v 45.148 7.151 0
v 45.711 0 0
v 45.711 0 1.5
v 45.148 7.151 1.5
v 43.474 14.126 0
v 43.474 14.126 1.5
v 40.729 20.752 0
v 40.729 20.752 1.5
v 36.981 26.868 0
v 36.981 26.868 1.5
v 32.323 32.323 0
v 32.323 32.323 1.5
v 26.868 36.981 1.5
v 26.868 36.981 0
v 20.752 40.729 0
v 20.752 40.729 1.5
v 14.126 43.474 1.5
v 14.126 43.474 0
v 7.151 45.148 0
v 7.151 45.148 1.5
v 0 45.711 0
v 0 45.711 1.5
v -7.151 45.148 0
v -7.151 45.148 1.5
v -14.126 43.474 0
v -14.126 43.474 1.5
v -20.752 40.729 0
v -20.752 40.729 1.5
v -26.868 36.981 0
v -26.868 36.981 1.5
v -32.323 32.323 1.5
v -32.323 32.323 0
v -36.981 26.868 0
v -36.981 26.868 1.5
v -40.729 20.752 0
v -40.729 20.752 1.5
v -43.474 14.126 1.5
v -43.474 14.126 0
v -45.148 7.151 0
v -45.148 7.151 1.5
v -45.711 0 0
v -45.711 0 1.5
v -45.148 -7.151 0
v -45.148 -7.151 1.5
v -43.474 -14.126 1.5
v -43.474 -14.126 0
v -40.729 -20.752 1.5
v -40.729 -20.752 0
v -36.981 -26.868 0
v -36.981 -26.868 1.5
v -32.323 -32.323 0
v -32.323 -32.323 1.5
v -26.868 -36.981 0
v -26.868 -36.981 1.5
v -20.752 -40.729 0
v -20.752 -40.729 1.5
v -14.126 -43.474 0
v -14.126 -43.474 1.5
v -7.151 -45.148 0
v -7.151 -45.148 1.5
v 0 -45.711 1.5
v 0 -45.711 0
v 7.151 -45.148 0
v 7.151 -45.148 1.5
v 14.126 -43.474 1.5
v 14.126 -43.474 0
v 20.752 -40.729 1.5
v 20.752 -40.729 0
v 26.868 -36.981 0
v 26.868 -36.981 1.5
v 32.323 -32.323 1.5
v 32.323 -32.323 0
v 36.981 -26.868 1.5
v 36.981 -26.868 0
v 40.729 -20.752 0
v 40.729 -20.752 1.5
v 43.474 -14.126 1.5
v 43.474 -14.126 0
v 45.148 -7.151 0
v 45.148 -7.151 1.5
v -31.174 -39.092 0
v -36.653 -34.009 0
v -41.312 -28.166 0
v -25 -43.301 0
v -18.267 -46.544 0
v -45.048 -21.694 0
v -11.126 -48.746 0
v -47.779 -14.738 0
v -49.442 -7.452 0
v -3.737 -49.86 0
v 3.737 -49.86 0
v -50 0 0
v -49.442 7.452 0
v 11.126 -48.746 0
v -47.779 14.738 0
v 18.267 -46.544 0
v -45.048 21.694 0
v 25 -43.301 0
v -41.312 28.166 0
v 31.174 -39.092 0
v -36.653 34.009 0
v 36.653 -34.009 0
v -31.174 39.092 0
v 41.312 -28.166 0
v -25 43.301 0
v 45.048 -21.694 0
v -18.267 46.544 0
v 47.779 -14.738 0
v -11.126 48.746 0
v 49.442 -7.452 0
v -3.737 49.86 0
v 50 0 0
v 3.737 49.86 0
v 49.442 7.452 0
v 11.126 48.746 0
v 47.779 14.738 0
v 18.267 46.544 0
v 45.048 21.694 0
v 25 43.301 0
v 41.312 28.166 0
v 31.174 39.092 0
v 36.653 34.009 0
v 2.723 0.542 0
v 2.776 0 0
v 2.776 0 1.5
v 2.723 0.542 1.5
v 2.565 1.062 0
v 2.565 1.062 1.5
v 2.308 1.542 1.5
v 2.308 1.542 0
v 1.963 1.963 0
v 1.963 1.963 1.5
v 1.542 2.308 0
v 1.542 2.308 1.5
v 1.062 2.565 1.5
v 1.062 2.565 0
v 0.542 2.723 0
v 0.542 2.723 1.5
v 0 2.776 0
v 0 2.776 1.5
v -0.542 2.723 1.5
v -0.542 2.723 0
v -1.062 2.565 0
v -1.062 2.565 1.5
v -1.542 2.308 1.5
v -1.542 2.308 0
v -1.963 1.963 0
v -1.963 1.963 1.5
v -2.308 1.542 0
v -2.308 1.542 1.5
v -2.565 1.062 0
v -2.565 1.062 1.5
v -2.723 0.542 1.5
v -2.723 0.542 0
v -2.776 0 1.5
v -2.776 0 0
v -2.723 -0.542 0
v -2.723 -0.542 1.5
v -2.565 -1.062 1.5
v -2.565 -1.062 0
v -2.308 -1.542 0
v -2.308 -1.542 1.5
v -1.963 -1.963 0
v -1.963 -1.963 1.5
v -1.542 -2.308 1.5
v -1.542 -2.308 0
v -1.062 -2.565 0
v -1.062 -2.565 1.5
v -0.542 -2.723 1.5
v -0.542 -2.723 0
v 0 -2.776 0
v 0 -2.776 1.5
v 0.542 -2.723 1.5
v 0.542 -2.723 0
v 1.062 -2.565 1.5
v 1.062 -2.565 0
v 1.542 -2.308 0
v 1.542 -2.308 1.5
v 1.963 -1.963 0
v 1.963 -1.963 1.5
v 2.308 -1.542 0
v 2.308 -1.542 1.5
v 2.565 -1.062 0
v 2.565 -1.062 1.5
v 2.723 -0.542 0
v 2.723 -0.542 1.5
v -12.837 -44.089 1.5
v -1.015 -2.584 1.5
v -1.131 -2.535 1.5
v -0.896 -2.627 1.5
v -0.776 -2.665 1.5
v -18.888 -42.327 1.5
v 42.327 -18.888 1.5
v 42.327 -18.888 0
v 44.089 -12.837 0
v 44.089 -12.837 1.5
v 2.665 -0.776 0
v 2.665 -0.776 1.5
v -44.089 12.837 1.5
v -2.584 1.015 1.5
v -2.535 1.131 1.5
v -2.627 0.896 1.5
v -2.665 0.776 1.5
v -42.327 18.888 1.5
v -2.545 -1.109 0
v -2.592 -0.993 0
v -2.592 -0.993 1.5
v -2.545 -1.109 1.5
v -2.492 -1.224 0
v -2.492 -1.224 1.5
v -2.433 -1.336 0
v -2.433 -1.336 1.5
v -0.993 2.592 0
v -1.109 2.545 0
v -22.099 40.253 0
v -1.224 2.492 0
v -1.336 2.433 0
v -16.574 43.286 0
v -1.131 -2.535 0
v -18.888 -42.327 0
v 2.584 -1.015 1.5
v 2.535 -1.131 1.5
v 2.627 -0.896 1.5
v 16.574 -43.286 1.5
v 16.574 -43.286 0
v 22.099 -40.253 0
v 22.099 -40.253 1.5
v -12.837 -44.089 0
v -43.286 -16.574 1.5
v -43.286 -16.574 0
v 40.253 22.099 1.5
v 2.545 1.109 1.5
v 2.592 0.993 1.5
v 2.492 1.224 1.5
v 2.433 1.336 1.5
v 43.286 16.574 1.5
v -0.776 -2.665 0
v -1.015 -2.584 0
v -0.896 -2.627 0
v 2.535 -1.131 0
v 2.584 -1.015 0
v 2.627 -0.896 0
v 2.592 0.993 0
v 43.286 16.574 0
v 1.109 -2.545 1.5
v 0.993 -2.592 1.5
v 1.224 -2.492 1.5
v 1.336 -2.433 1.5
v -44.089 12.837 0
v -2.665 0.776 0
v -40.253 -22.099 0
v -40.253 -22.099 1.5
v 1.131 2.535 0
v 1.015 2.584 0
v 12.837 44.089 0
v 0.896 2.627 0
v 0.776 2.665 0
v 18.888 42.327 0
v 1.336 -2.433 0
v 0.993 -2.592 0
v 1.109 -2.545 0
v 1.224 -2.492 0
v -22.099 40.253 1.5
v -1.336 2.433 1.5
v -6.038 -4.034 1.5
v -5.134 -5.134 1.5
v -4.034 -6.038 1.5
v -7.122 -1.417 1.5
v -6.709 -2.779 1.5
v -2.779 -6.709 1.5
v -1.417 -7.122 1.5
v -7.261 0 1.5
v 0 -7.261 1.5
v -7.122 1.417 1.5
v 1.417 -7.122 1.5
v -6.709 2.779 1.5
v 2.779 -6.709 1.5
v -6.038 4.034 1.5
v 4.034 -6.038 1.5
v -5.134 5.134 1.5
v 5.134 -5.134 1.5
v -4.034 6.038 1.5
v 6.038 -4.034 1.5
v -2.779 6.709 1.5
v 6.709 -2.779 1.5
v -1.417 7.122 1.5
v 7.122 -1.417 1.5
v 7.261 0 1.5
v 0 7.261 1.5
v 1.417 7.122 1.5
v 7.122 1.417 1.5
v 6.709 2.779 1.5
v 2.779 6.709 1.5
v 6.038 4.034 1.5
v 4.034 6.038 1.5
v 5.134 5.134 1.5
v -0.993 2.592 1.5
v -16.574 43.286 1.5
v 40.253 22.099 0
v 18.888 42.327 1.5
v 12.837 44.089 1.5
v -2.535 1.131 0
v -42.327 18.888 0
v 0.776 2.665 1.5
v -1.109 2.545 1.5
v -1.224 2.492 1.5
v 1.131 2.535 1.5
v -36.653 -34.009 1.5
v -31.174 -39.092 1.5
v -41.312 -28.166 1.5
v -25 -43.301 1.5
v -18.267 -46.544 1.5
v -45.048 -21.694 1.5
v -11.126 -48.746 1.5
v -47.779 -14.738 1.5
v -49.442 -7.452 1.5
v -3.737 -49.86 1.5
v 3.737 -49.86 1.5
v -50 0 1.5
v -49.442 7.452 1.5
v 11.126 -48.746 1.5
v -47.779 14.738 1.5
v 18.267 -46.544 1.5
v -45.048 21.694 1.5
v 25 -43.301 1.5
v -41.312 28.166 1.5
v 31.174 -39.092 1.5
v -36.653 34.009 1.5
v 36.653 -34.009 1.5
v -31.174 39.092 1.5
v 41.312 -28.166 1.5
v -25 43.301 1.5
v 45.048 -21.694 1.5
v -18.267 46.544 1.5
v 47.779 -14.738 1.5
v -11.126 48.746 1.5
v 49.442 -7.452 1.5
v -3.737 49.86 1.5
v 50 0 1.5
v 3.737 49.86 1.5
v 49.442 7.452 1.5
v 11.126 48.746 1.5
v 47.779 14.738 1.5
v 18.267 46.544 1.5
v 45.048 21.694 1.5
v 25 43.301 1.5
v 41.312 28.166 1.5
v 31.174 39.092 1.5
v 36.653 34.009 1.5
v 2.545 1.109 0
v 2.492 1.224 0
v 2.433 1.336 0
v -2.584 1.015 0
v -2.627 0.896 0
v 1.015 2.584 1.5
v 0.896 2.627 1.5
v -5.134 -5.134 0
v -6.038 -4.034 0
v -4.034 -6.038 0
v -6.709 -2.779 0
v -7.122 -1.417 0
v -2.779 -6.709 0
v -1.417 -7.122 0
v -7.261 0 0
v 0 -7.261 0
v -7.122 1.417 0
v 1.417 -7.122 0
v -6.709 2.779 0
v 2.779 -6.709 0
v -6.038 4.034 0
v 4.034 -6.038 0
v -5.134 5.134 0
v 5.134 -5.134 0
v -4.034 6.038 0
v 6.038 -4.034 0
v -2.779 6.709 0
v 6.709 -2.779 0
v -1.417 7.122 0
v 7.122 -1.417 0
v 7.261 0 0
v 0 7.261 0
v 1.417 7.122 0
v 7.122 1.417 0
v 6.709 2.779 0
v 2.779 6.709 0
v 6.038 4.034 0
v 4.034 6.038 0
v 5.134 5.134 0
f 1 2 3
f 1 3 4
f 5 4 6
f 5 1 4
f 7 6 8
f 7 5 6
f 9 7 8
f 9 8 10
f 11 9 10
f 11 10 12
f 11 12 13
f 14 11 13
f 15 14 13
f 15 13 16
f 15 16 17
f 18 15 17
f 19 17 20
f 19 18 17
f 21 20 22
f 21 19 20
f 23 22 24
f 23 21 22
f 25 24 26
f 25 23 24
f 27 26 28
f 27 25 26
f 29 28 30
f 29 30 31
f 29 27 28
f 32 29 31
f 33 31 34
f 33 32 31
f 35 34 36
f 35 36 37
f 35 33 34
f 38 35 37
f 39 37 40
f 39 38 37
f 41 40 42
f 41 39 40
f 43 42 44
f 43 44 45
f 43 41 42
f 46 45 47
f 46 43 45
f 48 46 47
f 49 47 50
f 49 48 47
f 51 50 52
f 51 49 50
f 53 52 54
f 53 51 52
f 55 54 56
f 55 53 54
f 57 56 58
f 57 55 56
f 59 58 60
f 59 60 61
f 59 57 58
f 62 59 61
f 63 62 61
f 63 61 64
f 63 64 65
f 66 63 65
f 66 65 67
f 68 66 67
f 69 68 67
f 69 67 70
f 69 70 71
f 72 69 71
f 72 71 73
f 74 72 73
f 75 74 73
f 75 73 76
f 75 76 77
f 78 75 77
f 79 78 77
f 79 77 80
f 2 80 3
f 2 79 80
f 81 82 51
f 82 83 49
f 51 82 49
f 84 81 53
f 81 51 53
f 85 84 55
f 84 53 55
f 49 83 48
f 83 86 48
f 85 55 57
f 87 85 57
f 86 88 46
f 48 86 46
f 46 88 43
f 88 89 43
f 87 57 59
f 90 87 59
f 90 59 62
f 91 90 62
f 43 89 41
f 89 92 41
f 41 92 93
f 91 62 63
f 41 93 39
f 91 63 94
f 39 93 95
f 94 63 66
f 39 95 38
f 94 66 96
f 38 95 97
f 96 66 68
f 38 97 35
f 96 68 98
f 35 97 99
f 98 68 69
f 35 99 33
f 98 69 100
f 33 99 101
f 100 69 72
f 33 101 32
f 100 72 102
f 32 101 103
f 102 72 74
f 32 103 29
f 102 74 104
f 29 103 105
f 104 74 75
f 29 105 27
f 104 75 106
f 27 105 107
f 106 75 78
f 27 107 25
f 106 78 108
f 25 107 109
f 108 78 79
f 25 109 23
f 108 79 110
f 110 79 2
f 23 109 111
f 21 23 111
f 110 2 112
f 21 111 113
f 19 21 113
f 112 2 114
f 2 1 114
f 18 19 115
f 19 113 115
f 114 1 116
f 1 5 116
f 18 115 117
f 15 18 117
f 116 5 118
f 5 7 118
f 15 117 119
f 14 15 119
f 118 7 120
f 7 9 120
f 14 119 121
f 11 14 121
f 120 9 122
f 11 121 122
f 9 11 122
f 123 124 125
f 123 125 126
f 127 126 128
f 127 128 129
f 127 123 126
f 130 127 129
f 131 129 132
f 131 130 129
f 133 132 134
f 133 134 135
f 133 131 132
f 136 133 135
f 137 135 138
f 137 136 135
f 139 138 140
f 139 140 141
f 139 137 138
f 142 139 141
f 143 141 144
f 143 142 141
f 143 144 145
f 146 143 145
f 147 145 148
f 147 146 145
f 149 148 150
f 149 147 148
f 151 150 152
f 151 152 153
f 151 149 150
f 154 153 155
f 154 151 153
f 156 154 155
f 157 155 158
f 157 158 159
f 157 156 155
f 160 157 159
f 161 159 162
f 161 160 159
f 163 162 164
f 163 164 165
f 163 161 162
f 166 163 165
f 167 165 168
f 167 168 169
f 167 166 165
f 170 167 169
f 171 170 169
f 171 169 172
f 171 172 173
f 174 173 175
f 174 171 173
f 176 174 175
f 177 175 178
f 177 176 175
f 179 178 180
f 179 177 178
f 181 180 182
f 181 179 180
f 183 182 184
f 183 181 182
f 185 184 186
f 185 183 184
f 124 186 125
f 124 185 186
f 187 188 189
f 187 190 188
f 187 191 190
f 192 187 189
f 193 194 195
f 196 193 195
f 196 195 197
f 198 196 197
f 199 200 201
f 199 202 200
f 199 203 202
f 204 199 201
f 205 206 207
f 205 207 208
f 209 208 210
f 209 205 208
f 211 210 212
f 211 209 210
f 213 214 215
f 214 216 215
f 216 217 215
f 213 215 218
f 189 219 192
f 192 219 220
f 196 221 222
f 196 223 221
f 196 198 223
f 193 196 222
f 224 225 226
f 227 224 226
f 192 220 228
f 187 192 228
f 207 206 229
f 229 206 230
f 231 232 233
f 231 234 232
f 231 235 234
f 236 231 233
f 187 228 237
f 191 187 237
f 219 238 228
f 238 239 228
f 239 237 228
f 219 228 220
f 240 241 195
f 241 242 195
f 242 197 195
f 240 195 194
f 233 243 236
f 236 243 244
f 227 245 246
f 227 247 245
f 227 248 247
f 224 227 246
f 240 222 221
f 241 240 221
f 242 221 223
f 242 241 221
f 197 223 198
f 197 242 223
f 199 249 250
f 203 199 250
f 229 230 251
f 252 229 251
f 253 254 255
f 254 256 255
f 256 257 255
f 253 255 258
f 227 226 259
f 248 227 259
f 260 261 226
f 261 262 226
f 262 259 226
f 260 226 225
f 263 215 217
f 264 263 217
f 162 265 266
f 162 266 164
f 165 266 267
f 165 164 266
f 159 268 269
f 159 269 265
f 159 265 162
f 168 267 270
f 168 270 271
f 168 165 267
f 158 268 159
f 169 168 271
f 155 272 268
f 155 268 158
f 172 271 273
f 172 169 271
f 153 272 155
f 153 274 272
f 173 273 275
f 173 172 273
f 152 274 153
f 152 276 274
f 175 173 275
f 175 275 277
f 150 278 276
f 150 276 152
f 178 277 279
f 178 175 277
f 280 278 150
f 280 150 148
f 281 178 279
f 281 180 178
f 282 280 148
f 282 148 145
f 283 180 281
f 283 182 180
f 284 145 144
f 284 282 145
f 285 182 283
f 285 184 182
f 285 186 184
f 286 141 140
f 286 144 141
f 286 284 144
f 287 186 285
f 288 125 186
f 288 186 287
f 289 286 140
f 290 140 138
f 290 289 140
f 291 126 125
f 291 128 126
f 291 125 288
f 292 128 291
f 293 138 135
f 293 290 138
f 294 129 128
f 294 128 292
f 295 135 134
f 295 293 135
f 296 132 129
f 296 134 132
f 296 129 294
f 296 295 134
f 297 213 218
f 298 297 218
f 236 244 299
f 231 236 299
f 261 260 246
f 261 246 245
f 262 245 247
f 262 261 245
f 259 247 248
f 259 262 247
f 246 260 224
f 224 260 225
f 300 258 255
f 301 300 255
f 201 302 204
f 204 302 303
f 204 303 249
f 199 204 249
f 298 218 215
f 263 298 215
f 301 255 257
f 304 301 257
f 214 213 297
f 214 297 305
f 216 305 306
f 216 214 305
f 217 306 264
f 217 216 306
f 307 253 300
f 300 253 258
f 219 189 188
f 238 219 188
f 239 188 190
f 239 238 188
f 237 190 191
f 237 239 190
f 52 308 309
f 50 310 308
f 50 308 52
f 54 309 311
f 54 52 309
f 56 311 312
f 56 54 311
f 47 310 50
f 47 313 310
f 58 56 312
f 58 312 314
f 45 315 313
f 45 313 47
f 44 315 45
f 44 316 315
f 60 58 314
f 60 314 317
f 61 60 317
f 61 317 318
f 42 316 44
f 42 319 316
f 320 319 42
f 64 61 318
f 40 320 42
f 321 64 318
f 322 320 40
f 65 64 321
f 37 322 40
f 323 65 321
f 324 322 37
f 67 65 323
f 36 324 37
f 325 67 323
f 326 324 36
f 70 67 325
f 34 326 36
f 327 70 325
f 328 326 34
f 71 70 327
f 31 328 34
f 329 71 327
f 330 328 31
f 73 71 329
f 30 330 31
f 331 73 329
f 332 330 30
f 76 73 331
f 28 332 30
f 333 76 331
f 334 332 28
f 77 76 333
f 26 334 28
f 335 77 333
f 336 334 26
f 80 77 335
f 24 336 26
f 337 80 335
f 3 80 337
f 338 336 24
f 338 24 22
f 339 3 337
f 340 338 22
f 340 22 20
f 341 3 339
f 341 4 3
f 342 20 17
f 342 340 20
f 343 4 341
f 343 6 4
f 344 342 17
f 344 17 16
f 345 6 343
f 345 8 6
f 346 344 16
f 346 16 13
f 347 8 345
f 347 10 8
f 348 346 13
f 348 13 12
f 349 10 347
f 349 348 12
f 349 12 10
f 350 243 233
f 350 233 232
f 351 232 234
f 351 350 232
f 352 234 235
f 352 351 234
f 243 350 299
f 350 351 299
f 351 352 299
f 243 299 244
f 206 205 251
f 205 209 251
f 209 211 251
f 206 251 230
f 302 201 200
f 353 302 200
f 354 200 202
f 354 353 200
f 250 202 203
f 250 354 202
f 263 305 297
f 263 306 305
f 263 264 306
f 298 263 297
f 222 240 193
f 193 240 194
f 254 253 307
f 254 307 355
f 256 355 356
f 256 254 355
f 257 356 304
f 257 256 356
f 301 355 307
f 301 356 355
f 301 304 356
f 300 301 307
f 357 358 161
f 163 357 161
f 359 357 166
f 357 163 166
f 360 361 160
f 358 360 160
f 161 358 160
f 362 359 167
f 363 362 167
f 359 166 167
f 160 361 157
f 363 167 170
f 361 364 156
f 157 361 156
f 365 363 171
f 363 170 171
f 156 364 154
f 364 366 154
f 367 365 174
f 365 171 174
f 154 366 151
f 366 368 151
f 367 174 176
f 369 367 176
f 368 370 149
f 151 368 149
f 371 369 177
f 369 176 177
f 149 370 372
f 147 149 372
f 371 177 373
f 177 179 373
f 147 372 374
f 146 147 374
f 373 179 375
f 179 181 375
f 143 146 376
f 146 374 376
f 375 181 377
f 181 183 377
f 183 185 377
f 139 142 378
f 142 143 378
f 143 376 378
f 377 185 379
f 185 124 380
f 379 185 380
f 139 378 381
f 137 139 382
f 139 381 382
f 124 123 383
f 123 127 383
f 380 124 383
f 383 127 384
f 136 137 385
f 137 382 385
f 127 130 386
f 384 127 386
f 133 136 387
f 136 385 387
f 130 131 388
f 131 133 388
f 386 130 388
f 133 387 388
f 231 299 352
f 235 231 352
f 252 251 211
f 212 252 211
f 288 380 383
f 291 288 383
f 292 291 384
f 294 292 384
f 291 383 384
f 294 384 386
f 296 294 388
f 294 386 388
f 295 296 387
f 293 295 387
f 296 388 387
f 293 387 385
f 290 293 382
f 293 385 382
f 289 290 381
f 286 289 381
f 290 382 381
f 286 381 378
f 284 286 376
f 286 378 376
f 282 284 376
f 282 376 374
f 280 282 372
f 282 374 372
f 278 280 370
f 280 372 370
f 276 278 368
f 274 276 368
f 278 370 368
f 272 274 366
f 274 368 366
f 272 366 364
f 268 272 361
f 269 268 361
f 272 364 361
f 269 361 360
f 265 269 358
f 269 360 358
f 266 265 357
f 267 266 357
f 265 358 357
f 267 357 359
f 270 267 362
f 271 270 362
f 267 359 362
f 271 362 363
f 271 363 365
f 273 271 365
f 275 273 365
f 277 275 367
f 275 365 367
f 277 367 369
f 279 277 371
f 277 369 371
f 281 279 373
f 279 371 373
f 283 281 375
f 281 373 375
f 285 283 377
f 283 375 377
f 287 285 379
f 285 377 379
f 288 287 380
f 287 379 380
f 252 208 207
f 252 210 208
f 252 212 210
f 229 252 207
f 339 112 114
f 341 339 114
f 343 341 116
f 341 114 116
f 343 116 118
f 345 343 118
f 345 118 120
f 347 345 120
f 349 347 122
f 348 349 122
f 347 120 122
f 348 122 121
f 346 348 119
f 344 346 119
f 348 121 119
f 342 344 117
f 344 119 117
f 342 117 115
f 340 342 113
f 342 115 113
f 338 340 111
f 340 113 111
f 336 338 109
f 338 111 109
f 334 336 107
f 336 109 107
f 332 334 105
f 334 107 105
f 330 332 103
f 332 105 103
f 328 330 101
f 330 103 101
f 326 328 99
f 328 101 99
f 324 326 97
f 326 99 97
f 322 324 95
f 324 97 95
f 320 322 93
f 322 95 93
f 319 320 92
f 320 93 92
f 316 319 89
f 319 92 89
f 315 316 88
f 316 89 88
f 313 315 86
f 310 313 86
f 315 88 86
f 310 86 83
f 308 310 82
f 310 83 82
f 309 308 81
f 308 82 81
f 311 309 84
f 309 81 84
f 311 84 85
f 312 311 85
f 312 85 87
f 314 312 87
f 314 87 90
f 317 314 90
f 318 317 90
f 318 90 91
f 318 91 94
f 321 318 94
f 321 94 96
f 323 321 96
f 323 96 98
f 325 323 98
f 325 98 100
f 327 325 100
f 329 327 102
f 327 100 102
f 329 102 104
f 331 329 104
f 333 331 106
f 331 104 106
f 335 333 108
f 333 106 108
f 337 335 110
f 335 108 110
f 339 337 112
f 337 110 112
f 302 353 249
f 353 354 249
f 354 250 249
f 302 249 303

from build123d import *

# Parameters (mm, degrees)
F1_R     = 50
F1_R_2   = 45.711261
F2_DEPTH = 1.5
F3_R     = 7.261252
F4_DEPTH = 1.5
F6_DEPTH = 1.5
F7_COUNT = 8
F8_R     = 2.776
F9_DEPTH = 1.5


with BuildPart() as f2:
    # F1 (on face) → F2 (new body)
    with BuildSketch(Plane.XY):
        Circle(F1_R)
        Circle(F1_R_2, mode=Mode.SUBTRACT)
    extrude(amount=F2_DEPTH)


with BuildPart() as f4:
    # F3 (on Top) → F4 (new body)
    with BuildSketch(Plane.XY):
        Circle(F3_R)
    extrude(amount=F4_DEPTH)


with BuildPart() as f6:
    # F5 (on Top) → F6 (new body)
    with BuildSketch(Plane.XY):
        Polygon((-22.098884, 40.252522), (0, 0), (-16.573982, 43.285727), align=None)
    extrude(amount=F6_DEPTH)


with BuildPart() as f7_1:
    # F7: instance of F6
    add(f6.part.rotate(Axis((0, 0, 1.5), (0, 0, 1)), 1 * 360 / F7_COUNT))


with BuildPart() as f7_2:
    # F7: instance of F6
    add(f6.part.rotate(Axis((0, 0, 1.5), (0, 0, 1)), 2 * 360 / F7_COUNT))


with BuildPart() as f7_3:
    # F7: instance of F6
    add(f6.part.rotate(Axis((0, 0, 1.5), (0, 0, 1)), 3 * 360 / F7_COUNT))


with BuildPart() as f7_4:
    # F7: instance of F6
    add(f6.part.rotate(Axis((0, 0, 1.5), (0, 0, 1)), 4 * 360 / F7_COUNT))


with BuildPart() as f7_5:
    # F7: instance of F6
    add(f6.part.rotate(Axis((0, 0, 1.5), (0, 0, 1)), 5 * 360 / F7_COUNT))


with BuildPart() as f7_6:
    # F7: instance of F6
    add(f6.part.rotate(Axis((0, 0, 1.5), (0, 0, 1)), 6 * 360 / F7_COUNT))


with BuildPart() as f7_7:
    # F7: instance of F6
    add(f6.part.rotate(Axis((0, 0, 1.5), (0, 0, 1)), 7 * 360 / F7_COUNT))


with BuildPart() as f9_tool:
    # F8 (on Top) → F9 (new body)
    with BuildSketch(Plane.XY):
        Circle(F8_R)
    extrude(amount=F9_DEPTH)


with BuildPart() as f4_1:
    add(f4.part)

    # F9: cut by f9_tool
    add(f9_tool.part, mode=Mode.SUBTRACT)


with BuildPart() as f6_1:
    add(f6.part)

    # F9: cut by f9_tool
    add(f9_tool.part, mode=Mode.SUBTRACT)


with BuildPart() as f7_1_1:
    add(f7_1.part)

    # F9: cut by f9_tool
    add(f9_tool.part, mode=Mode.SUBTRACT)


with BuildPart() as f7_2_1:
    add(f7_2.part)

    # F9: cut by f9_tool
    add(f9_tool.part, mode=Mode.SUBTRACT)


with BuildPart() as f7_3_1:
    add(f7_3.part)

    # F9: cut by f9_tool
    add(f9_tool.part, mode=Mode.SUBTRACT)


with BuildPart() as f7_4_1:
    add(f7_4.part)

    # F9: cut by f9_tool
    add(f9_tool.part, mode=Mode.SUBTRACT)


with BuildPart() as f7_5_1:
    add(f7_5.part)

    # F9: cut by f9_tool
    add(f9_tool.part, mode=Mode.SUBTRACT)


with BuildPart() as f7_6_1:
    add(f7_6.part)

    # F9: cut by f9_tool
    add(f9_tool.part, mode=Mode.SUBTRACT)


with BuildPart() as f7_7_1:
    add(f7_7.part)

    # F9: cut by f9_tool
    add(f9_tool.part, mode=Mode.SUBTRACT)


solid = Compound([f2.part, f4_1.part, f6_1.part, f7_1_1.part, f7_2_1.part, f7_3_1.part, f7_4_1.part, f7_5_1.part, f7_6_1.part, f7_7_1.part])
